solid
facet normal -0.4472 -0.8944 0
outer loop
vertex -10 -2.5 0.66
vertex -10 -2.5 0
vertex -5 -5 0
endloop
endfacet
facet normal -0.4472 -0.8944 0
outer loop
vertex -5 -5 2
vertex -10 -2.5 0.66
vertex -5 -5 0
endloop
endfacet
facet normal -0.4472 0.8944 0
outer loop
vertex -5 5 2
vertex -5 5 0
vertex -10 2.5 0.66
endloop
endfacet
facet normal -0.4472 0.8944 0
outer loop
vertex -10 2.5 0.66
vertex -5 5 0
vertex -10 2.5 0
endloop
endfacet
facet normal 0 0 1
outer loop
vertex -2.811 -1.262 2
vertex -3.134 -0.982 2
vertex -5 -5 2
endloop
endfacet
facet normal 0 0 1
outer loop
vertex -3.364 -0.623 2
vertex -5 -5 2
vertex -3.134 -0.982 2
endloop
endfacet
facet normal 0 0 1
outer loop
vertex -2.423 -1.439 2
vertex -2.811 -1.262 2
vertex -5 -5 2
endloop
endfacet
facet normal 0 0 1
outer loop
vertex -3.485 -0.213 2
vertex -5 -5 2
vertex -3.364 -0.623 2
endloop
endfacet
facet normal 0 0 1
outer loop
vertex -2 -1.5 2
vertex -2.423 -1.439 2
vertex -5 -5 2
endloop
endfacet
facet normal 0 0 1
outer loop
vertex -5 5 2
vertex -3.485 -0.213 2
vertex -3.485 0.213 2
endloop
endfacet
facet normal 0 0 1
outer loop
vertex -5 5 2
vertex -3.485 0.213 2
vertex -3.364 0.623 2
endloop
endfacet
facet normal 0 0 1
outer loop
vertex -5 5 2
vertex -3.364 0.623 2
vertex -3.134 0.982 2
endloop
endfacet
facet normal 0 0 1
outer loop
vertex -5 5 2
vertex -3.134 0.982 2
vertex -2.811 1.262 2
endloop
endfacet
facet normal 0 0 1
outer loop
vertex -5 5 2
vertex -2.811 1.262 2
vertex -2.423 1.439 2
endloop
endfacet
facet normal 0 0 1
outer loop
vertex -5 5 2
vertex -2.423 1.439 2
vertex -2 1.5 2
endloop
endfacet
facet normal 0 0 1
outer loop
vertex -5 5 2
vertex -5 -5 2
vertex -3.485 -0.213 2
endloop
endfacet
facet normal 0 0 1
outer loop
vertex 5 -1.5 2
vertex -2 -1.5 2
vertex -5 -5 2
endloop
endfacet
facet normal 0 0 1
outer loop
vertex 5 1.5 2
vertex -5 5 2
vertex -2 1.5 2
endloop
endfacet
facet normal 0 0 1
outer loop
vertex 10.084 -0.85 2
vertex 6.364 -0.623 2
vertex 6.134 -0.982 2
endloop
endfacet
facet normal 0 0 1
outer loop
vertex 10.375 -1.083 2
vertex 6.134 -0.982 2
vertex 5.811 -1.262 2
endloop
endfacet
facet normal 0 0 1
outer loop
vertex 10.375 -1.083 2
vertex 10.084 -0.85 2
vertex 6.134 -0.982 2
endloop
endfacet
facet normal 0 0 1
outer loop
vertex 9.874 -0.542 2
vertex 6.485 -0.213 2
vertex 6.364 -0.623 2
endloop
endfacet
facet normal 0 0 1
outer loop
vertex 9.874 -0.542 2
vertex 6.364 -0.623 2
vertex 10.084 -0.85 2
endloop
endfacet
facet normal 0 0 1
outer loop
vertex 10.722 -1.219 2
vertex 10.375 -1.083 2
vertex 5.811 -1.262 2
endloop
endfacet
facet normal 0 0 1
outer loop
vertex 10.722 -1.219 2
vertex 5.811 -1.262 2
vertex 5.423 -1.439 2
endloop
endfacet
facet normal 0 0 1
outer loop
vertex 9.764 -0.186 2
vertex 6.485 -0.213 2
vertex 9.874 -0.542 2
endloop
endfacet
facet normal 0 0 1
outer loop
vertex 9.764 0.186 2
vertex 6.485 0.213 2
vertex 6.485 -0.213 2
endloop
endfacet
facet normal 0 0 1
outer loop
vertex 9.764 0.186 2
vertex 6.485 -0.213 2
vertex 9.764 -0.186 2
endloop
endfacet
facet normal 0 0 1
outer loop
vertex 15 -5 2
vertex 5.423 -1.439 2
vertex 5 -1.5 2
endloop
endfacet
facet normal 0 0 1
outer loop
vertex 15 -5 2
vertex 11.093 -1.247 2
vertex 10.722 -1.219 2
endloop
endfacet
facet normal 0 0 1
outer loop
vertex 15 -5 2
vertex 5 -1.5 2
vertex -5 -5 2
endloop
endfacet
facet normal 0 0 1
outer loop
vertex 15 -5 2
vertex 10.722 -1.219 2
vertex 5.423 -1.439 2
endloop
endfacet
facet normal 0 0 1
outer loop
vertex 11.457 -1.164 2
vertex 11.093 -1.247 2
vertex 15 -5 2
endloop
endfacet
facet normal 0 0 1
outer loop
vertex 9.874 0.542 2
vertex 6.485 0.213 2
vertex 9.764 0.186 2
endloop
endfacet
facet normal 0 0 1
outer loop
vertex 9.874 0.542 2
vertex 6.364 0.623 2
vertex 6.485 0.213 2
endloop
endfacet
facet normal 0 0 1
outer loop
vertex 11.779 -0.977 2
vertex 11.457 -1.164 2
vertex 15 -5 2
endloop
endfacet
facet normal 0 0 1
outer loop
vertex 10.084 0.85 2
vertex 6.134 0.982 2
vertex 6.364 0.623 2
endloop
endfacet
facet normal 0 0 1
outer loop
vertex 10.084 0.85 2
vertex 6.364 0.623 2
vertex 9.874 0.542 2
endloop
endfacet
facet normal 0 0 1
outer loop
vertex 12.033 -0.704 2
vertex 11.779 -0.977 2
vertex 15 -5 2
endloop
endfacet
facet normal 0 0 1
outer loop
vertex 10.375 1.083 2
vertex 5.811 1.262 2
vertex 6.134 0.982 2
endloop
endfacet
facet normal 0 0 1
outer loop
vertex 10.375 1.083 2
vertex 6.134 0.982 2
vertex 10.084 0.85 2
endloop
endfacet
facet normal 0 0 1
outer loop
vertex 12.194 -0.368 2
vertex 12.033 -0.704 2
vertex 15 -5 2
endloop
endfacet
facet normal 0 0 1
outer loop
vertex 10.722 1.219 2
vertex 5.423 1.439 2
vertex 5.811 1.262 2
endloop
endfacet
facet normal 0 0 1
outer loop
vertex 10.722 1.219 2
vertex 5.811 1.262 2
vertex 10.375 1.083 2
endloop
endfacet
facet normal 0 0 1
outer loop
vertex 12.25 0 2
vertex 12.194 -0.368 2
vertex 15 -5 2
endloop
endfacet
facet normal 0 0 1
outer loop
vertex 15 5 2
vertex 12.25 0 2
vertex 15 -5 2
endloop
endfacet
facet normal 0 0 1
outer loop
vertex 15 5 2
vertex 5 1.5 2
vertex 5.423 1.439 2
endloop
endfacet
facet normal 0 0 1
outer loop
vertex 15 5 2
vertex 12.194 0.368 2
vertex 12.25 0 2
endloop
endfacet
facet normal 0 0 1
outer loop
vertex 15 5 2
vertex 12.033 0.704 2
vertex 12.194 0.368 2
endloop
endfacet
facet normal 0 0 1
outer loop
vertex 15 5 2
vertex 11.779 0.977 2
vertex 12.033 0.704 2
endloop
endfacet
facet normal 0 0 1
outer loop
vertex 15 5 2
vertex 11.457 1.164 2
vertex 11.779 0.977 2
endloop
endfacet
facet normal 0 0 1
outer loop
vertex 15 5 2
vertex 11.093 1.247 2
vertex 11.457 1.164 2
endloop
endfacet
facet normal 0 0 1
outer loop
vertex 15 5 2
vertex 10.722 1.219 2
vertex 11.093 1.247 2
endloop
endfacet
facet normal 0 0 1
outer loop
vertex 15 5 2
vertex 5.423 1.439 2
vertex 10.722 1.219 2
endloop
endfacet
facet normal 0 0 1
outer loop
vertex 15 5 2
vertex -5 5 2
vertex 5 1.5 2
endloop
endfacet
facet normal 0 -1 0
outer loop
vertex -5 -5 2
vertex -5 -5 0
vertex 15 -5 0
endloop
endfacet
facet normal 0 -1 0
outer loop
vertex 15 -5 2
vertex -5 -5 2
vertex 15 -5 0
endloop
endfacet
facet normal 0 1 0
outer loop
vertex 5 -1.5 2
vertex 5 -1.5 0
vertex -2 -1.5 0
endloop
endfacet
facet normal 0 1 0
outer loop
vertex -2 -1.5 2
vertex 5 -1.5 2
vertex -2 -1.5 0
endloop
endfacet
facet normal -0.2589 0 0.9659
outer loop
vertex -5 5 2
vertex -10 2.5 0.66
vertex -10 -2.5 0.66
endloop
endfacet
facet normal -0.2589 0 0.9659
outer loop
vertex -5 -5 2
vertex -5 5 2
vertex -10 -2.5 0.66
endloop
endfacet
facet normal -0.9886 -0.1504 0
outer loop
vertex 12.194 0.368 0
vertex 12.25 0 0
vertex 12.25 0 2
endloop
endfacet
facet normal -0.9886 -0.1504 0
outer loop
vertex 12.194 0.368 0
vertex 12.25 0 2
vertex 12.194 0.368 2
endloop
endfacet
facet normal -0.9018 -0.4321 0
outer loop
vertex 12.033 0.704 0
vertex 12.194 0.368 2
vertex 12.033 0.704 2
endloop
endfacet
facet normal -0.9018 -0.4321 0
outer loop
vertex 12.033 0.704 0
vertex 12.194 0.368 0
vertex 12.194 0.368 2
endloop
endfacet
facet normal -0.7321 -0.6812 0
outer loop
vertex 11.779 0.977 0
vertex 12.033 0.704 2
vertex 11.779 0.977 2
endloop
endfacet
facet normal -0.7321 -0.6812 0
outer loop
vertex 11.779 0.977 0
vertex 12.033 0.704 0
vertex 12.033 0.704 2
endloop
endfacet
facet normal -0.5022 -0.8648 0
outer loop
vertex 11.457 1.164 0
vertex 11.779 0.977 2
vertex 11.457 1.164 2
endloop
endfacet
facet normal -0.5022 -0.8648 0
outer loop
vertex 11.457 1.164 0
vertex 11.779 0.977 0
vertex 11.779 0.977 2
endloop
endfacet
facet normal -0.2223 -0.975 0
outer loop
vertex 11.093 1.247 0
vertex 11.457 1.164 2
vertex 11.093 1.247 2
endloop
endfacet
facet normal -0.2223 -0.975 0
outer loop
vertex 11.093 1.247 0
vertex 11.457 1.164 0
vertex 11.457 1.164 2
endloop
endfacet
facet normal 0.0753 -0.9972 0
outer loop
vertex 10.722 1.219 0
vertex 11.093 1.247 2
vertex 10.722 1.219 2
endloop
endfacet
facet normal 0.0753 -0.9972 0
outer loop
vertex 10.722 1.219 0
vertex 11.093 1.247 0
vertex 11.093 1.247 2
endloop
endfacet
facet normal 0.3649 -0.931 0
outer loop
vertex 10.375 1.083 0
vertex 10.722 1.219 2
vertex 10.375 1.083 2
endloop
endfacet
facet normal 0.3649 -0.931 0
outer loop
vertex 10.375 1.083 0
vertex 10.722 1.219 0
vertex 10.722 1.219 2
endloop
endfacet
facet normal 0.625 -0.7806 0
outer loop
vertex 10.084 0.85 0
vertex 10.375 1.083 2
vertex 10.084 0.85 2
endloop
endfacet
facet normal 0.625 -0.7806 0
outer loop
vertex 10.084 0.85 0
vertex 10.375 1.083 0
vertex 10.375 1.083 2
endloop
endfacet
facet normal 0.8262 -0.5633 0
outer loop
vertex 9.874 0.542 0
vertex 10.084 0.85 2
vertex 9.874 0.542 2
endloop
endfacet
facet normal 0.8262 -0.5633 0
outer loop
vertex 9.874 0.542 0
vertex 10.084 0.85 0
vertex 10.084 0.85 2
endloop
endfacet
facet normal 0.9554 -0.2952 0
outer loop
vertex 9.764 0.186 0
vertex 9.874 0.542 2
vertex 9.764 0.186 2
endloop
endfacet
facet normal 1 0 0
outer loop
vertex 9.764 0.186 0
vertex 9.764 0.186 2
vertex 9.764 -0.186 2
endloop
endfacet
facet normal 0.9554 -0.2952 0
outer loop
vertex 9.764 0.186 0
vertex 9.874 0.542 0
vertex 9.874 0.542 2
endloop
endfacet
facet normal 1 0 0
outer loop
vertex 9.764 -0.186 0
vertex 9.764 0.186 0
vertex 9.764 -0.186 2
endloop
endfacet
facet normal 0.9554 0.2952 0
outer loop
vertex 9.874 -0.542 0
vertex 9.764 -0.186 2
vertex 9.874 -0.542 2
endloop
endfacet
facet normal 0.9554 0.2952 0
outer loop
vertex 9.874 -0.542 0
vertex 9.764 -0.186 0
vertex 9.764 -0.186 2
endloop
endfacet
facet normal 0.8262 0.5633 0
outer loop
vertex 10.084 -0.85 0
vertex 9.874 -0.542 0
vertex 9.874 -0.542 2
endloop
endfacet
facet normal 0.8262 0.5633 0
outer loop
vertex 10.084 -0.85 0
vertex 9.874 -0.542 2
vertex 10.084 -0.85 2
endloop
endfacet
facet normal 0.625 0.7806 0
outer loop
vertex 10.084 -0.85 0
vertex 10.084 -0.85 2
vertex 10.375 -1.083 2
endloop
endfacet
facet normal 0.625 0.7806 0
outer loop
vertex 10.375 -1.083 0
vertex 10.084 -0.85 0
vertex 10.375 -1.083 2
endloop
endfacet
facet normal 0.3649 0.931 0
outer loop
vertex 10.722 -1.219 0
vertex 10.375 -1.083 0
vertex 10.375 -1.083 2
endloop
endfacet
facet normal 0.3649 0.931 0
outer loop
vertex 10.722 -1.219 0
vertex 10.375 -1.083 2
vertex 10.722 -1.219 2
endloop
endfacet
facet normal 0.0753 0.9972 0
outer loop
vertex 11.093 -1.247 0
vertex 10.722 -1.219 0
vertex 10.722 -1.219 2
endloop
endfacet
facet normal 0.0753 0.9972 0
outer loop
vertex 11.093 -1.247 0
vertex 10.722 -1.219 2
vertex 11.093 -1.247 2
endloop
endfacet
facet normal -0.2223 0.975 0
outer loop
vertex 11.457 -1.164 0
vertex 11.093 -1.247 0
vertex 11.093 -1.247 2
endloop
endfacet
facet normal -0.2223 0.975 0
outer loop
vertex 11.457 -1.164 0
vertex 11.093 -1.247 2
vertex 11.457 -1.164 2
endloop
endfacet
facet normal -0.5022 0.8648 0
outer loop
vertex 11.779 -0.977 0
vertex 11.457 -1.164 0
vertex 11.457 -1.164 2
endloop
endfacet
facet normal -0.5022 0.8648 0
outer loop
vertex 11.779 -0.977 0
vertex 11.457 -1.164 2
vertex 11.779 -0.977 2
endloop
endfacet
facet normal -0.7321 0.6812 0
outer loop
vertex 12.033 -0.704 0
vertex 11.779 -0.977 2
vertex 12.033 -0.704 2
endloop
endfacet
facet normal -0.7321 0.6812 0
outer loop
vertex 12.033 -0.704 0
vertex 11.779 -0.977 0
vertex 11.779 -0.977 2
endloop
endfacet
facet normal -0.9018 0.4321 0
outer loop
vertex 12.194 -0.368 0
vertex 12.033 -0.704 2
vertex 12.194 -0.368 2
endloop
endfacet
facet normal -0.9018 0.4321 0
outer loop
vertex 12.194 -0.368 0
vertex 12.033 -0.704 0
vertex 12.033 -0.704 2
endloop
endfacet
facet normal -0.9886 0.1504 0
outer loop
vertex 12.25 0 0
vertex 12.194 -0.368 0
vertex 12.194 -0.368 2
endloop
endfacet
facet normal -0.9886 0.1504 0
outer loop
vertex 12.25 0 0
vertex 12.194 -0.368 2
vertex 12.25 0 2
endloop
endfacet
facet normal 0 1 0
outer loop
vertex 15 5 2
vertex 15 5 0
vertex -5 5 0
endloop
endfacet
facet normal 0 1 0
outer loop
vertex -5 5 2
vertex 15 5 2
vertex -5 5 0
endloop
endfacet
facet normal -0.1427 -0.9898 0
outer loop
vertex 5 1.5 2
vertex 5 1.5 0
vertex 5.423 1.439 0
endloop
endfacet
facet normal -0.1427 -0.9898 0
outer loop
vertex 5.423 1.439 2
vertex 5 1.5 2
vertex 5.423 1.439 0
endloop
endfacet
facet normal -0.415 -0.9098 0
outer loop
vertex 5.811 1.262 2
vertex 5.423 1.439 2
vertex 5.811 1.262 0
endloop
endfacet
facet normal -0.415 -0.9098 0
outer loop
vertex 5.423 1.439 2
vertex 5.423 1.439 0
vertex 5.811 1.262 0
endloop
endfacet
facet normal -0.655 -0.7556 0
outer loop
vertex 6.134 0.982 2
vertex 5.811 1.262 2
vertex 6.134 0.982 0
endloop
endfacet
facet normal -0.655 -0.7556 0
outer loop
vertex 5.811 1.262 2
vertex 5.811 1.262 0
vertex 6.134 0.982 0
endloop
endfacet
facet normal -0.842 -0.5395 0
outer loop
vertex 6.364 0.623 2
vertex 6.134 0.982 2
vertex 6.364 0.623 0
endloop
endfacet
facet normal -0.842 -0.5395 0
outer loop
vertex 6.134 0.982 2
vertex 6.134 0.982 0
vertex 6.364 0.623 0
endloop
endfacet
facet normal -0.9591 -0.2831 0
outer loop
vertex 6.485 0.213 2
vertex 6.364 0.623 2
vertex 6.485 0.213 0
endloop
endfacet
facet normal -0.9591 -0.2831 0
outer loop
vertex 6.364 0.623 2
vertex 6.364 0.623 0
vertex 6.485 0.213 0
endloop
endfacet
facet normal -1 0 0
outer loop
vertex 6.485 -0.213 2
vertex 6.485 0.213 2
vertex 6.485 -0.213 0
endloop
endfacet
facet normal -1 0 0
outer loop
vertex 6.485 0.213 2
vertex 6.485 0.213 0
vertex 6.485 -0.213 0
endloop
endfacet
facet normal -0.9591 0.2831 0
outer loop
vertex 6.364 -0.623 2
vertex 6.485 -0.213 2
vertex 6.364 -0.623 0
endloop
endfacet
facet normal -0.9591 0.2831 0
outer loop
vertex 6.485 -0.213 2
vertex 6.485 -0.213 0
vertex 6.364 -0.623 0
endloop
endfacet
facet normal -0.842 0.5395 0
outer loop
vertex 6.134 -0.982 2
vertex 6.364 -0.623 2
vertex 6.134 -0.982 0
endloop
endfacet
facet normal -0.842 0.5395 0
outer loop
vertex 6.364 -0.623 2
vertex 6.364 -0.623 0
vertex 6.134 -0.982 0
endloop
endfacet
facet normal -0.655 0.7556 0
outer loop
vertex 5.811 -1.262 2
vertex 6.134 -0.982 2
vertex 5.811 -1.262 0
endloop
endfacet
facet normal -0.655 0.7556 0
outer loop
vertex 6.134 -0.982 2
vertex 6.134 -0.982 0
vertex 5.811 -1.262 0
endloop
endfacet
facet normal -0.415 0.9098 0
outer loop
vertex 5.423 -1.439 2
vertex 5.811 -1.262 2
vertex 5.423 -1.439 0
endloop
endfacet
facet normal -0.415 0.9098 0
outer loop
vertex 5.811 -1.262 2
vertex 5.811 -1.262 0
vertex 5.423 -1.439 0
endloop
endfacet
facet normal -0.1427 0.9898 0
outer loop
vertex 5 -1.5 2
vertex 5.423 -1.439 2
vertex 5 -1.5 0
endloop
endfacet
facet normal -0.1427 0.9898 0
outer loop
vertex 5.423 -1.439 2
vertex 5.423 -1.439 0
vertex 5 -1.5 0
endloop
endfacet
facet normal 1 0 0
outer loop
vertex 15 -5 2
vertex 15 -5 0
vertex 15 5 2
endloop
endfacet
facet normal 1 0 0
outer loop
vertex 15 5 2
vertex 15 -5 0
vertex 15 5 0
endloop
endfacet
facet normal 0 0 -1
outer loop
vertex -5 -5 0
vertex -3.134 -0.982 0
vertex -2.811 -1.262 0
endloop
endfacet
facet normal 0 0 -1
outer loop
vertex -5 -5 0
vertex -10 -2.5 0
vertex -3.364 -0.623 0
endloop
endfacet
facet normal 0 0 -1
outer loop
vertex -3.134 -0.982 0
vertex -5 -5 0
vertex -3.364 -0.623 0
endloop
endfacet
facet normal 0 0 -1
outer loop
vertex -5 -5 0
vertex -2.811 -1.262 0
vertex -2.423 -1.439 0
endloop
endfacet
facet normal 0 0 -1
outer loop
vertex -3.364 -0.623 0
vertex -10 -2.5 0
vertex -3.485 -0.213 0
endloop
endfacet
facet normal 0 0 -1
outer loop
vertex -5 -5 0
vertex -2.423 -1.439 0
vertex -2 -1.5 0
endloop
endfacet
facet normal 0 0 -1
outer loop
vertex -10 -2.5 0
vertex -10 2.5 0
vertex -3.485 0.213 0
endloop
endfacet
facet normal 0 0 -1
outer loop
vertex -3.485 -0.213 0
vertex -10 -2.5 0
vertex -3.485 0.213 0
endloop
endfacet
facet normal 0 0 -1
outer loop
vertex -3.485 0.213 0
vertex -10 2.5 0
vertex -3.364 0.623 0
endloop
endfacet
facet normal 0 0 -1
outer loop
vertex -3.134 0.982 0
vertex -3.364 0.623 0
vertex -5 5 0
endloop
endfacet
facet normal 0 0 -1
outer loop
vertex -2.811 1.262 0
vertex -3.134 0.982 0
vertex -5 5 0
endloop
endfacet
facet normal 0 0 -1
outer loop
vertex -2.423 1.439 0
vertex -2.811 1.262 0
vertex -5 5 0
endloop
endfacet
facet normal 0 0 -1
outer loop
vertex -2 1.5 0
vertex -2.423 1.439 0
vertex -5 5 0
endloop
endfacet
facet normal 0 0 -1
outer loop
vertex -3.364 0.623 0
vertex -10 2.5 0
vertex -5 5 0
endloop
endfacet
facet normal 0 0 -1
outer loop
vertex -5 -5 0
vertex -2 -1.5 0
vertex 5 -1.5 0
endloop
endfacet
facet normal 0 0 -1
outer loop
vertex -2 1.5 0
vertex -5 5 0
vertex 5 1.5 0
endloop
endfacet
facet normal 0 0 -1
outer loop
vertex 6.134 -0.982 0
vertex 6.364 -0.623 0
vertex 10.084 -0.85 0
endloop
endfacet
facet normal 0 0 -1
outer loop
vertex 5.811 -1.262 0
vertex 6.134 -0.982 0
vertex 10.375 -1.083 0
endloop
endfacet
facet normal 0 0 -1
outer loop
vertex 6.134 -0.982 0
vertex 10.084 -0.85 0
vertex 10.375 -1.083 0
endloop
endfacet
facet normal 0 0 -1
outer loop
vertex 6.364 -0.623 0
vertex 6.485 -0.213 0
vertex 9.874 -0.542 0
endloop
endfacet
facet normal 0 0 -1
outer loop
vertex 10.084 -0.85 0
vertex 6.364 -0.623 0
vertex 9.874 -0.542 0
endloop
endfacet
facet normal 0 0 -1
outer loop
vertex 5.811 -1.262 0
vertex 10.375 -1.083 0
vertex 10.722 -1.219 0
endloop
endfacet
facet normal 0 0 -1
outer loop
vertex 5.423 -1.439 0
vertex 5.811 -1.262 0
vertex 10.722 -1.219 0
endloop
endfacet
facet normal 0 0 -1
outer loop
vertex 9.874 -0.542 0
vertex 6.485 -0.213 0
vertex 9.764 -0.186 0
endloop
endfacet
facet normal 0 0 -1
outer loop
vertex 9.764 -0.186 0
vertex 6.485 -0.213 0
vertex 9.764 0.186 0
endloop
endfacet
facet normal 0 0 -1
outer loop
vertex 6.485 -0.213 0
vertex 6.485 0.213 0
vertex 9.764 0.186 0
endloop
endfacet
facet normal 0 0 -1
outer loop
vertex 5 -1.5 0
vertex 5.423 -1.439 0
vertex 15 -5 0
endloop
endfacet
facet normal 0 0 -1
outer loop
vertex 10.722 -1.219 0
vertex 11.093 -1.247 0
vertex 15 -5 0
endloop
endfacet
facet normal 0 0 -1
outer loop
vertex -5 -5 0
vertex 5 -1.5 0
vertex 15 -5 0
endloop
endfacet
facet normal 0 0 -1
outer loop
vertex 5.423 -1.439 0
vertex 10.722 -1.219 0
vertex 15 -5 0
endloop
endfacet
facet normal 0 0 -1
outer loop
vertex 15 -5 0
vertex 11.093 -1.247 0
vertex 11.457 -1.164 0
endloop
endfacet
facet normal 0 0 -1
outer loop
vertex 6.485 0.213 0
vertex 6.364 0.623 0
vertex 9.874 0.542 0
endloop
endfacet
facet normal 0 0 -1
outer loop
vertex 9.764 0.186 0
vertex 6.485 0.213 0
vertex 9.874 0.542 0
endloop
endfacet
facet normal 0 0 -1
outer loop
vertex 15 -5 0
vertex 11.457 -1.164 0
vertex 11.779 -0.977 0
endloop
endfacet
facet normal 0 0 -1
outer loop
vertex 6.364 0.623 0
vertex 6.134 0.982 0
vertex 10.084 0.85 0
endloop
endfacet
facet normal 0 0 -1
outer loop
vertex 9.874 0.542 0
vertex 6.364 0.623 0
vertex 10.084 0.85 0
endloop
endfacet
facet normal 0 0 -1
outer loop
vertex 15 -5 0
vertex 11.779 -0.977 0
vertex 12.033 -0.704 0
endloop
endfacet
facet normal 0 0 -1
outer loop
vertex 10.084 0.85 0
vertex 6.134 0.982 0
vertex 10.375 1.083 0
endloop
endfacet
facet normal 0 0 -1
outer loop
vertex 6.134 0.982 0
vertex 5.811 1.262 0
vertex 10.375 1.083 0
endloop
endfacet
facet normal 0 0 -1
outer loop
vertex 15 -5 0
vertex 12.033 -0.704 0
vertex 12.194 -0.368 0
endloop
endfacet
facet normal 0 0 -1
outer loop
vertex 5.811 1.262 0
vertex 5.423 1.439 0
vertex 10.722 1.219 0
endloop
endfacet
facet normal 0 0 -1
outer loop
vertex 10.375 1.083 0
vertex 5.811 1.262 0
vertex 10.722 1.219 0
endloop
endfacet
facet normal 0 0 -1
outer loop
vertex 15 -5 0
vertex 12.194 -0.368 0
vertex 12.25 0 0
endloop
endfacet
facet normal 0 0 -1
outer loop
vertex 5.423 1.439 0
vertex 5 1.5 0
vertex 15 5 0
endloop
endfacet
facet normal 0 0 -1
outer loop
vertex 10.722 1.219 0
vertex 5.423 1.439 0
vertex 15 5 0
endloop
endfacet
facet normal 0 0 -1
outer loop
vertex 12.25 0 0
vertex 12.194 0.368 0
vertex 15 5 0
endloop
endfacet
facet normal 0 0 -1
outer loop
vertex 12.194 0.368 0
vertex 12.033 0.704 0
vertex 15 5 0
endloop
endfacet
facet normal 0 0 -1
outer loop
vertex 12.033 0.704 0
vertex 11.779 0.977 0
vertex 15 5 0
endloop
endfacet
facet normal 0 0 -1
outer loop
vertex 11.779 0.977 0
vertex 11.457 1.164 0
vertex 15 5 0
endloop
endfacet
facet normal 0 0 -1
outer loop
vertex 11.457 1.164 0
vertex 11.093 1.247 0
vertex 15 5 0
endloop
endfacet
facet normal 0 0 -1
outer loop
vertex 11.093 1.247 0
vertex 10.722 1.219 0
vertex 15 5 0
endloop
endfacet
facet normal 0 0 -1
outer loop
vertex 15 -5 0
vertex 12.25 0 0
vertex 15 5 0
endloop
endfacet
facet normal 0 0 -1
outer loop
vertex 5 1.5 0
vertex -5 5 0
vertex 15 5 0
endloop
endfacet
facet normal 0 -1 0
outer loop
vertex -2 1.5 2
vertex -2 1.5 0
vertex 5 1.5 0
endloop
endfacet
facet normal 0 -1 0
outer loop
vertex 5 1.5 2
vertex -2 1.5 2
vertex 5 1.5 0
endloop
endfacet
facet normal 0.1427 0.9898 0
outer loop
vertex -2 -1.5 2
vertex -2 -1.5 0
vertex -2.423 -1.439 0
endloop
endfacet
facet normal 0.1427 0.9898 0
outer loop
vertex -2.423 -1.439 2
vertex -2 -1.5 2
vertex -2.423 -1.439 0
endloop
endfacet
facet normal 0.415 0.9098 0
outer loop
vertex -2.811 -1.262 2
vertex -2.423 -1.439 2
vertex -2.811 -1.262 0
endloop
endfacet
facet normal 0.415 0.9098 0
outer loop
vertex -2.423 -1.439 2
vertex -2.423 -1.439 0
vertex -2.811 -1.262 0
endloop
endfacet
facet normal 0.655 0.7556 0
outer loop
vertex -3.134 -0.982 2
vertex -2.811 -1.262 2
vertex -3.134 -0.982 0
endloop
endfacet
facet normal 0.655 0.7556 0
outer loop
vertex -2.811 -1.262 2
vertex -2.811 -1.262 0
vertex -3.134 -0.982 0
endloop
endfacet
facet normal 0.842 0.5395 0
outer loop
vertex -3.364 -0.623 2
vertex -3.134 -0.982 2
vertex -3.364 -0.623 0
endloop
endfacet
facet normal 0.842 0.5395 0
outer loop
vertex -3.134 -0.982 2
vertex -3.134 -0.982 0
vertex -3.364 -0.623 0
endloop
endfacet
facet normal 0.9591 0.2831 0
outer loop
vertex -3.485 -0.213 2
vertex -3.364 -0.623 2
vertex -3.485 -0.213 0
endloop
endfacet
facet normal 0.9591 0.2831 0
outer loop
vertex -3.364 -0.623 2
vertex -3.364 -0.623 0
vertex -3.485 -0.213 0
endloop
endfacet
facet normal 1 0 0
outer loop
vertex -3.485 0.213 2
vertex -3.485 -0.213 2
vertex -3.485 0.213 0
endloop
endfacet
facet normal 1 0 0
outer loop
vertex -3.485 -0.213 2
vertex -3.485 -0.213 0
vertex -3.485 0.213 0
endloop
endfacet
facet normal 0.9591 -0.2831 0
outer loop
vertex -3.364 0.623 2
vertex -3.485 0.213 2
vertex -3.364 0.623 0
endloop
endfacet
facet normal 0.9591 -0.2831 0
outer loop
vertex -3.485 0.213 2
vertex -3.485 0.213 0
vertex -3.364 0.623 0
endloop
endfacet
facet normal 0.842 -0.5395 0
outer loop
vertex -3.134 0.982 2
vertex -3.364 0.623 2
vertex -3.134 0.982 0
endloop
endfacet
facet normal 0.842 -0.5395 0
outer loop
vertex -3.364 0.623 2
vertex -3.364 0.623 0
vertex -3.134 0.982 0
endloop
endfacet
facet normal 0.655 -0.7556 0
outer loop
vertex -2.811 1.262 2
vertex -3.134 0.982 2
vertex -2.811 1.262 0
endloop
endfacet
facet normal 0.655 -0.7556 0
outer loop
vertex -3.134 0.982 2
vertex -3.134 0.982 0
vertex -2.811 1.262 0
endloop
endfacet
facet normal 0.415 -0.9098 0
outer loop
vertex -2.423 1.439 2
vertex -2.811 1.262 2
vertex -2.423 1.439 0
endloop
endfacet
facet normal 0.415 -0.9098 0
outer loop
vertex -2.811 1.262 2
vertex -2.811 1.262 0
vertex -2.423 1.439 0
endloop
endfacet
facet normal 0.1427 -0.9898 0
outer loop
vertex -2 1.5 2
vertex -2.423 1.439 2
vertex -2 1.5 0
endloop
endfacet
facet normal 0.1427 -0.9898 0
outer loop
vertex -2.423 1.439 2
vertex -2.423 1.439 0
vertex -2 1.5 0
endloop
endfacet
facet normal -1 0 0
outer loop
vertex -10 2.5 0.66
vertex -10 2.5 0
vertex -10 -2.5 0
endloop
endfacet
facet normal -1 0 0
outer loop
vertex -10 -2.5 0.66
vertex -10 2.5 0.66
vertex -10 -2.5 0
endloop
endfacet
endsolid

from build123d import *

# Parameters (mm, degrees)
F0_R     = 1.25
F1_DEPTH = 2
F2_SIZE2 = 1.3397459622
F2_SIZE  = 5


with BuildPart() as f1:
    # F0 (on Top) → F1 (new body)
    with BuildSketch(Plane.XY):
        Polygon((15, -5), (15, 5), (-5, 5), (-10, 2.5), (-10, -2.5), (-5, -5), align=None)
        with BuildLine():
            ThreePointArc((-2, -1.5), (-3.5, 0), (-2, 1.5))
            Line((-2, 1.5), (5, 1.5))
            ThreePointArc((5, 1.5), (6.5, 0), (5, -1.5))
            Line((5, -1.5), (-2, -1.5))
        make_face(mode=Mode.SUBTRACT)
        with Locations((11, 0)):
            Circle(F0_R, mode=Mode.SUBTRACT)
    extrude(amount=F1_DEPTH)

    # F2
    f2_edges = [f1.edges().sort_by_distance(p)[0] for p in [
        (-10, 0, 2),
    ]]
    f2_side = f1.faces().sort_by_distance((14.730742, 0, 2))[0]
    chamfer(f2_edges, length=F2_SIZE, length2=F2_SIZE2, reference=f2_side)


solid = f1.part
